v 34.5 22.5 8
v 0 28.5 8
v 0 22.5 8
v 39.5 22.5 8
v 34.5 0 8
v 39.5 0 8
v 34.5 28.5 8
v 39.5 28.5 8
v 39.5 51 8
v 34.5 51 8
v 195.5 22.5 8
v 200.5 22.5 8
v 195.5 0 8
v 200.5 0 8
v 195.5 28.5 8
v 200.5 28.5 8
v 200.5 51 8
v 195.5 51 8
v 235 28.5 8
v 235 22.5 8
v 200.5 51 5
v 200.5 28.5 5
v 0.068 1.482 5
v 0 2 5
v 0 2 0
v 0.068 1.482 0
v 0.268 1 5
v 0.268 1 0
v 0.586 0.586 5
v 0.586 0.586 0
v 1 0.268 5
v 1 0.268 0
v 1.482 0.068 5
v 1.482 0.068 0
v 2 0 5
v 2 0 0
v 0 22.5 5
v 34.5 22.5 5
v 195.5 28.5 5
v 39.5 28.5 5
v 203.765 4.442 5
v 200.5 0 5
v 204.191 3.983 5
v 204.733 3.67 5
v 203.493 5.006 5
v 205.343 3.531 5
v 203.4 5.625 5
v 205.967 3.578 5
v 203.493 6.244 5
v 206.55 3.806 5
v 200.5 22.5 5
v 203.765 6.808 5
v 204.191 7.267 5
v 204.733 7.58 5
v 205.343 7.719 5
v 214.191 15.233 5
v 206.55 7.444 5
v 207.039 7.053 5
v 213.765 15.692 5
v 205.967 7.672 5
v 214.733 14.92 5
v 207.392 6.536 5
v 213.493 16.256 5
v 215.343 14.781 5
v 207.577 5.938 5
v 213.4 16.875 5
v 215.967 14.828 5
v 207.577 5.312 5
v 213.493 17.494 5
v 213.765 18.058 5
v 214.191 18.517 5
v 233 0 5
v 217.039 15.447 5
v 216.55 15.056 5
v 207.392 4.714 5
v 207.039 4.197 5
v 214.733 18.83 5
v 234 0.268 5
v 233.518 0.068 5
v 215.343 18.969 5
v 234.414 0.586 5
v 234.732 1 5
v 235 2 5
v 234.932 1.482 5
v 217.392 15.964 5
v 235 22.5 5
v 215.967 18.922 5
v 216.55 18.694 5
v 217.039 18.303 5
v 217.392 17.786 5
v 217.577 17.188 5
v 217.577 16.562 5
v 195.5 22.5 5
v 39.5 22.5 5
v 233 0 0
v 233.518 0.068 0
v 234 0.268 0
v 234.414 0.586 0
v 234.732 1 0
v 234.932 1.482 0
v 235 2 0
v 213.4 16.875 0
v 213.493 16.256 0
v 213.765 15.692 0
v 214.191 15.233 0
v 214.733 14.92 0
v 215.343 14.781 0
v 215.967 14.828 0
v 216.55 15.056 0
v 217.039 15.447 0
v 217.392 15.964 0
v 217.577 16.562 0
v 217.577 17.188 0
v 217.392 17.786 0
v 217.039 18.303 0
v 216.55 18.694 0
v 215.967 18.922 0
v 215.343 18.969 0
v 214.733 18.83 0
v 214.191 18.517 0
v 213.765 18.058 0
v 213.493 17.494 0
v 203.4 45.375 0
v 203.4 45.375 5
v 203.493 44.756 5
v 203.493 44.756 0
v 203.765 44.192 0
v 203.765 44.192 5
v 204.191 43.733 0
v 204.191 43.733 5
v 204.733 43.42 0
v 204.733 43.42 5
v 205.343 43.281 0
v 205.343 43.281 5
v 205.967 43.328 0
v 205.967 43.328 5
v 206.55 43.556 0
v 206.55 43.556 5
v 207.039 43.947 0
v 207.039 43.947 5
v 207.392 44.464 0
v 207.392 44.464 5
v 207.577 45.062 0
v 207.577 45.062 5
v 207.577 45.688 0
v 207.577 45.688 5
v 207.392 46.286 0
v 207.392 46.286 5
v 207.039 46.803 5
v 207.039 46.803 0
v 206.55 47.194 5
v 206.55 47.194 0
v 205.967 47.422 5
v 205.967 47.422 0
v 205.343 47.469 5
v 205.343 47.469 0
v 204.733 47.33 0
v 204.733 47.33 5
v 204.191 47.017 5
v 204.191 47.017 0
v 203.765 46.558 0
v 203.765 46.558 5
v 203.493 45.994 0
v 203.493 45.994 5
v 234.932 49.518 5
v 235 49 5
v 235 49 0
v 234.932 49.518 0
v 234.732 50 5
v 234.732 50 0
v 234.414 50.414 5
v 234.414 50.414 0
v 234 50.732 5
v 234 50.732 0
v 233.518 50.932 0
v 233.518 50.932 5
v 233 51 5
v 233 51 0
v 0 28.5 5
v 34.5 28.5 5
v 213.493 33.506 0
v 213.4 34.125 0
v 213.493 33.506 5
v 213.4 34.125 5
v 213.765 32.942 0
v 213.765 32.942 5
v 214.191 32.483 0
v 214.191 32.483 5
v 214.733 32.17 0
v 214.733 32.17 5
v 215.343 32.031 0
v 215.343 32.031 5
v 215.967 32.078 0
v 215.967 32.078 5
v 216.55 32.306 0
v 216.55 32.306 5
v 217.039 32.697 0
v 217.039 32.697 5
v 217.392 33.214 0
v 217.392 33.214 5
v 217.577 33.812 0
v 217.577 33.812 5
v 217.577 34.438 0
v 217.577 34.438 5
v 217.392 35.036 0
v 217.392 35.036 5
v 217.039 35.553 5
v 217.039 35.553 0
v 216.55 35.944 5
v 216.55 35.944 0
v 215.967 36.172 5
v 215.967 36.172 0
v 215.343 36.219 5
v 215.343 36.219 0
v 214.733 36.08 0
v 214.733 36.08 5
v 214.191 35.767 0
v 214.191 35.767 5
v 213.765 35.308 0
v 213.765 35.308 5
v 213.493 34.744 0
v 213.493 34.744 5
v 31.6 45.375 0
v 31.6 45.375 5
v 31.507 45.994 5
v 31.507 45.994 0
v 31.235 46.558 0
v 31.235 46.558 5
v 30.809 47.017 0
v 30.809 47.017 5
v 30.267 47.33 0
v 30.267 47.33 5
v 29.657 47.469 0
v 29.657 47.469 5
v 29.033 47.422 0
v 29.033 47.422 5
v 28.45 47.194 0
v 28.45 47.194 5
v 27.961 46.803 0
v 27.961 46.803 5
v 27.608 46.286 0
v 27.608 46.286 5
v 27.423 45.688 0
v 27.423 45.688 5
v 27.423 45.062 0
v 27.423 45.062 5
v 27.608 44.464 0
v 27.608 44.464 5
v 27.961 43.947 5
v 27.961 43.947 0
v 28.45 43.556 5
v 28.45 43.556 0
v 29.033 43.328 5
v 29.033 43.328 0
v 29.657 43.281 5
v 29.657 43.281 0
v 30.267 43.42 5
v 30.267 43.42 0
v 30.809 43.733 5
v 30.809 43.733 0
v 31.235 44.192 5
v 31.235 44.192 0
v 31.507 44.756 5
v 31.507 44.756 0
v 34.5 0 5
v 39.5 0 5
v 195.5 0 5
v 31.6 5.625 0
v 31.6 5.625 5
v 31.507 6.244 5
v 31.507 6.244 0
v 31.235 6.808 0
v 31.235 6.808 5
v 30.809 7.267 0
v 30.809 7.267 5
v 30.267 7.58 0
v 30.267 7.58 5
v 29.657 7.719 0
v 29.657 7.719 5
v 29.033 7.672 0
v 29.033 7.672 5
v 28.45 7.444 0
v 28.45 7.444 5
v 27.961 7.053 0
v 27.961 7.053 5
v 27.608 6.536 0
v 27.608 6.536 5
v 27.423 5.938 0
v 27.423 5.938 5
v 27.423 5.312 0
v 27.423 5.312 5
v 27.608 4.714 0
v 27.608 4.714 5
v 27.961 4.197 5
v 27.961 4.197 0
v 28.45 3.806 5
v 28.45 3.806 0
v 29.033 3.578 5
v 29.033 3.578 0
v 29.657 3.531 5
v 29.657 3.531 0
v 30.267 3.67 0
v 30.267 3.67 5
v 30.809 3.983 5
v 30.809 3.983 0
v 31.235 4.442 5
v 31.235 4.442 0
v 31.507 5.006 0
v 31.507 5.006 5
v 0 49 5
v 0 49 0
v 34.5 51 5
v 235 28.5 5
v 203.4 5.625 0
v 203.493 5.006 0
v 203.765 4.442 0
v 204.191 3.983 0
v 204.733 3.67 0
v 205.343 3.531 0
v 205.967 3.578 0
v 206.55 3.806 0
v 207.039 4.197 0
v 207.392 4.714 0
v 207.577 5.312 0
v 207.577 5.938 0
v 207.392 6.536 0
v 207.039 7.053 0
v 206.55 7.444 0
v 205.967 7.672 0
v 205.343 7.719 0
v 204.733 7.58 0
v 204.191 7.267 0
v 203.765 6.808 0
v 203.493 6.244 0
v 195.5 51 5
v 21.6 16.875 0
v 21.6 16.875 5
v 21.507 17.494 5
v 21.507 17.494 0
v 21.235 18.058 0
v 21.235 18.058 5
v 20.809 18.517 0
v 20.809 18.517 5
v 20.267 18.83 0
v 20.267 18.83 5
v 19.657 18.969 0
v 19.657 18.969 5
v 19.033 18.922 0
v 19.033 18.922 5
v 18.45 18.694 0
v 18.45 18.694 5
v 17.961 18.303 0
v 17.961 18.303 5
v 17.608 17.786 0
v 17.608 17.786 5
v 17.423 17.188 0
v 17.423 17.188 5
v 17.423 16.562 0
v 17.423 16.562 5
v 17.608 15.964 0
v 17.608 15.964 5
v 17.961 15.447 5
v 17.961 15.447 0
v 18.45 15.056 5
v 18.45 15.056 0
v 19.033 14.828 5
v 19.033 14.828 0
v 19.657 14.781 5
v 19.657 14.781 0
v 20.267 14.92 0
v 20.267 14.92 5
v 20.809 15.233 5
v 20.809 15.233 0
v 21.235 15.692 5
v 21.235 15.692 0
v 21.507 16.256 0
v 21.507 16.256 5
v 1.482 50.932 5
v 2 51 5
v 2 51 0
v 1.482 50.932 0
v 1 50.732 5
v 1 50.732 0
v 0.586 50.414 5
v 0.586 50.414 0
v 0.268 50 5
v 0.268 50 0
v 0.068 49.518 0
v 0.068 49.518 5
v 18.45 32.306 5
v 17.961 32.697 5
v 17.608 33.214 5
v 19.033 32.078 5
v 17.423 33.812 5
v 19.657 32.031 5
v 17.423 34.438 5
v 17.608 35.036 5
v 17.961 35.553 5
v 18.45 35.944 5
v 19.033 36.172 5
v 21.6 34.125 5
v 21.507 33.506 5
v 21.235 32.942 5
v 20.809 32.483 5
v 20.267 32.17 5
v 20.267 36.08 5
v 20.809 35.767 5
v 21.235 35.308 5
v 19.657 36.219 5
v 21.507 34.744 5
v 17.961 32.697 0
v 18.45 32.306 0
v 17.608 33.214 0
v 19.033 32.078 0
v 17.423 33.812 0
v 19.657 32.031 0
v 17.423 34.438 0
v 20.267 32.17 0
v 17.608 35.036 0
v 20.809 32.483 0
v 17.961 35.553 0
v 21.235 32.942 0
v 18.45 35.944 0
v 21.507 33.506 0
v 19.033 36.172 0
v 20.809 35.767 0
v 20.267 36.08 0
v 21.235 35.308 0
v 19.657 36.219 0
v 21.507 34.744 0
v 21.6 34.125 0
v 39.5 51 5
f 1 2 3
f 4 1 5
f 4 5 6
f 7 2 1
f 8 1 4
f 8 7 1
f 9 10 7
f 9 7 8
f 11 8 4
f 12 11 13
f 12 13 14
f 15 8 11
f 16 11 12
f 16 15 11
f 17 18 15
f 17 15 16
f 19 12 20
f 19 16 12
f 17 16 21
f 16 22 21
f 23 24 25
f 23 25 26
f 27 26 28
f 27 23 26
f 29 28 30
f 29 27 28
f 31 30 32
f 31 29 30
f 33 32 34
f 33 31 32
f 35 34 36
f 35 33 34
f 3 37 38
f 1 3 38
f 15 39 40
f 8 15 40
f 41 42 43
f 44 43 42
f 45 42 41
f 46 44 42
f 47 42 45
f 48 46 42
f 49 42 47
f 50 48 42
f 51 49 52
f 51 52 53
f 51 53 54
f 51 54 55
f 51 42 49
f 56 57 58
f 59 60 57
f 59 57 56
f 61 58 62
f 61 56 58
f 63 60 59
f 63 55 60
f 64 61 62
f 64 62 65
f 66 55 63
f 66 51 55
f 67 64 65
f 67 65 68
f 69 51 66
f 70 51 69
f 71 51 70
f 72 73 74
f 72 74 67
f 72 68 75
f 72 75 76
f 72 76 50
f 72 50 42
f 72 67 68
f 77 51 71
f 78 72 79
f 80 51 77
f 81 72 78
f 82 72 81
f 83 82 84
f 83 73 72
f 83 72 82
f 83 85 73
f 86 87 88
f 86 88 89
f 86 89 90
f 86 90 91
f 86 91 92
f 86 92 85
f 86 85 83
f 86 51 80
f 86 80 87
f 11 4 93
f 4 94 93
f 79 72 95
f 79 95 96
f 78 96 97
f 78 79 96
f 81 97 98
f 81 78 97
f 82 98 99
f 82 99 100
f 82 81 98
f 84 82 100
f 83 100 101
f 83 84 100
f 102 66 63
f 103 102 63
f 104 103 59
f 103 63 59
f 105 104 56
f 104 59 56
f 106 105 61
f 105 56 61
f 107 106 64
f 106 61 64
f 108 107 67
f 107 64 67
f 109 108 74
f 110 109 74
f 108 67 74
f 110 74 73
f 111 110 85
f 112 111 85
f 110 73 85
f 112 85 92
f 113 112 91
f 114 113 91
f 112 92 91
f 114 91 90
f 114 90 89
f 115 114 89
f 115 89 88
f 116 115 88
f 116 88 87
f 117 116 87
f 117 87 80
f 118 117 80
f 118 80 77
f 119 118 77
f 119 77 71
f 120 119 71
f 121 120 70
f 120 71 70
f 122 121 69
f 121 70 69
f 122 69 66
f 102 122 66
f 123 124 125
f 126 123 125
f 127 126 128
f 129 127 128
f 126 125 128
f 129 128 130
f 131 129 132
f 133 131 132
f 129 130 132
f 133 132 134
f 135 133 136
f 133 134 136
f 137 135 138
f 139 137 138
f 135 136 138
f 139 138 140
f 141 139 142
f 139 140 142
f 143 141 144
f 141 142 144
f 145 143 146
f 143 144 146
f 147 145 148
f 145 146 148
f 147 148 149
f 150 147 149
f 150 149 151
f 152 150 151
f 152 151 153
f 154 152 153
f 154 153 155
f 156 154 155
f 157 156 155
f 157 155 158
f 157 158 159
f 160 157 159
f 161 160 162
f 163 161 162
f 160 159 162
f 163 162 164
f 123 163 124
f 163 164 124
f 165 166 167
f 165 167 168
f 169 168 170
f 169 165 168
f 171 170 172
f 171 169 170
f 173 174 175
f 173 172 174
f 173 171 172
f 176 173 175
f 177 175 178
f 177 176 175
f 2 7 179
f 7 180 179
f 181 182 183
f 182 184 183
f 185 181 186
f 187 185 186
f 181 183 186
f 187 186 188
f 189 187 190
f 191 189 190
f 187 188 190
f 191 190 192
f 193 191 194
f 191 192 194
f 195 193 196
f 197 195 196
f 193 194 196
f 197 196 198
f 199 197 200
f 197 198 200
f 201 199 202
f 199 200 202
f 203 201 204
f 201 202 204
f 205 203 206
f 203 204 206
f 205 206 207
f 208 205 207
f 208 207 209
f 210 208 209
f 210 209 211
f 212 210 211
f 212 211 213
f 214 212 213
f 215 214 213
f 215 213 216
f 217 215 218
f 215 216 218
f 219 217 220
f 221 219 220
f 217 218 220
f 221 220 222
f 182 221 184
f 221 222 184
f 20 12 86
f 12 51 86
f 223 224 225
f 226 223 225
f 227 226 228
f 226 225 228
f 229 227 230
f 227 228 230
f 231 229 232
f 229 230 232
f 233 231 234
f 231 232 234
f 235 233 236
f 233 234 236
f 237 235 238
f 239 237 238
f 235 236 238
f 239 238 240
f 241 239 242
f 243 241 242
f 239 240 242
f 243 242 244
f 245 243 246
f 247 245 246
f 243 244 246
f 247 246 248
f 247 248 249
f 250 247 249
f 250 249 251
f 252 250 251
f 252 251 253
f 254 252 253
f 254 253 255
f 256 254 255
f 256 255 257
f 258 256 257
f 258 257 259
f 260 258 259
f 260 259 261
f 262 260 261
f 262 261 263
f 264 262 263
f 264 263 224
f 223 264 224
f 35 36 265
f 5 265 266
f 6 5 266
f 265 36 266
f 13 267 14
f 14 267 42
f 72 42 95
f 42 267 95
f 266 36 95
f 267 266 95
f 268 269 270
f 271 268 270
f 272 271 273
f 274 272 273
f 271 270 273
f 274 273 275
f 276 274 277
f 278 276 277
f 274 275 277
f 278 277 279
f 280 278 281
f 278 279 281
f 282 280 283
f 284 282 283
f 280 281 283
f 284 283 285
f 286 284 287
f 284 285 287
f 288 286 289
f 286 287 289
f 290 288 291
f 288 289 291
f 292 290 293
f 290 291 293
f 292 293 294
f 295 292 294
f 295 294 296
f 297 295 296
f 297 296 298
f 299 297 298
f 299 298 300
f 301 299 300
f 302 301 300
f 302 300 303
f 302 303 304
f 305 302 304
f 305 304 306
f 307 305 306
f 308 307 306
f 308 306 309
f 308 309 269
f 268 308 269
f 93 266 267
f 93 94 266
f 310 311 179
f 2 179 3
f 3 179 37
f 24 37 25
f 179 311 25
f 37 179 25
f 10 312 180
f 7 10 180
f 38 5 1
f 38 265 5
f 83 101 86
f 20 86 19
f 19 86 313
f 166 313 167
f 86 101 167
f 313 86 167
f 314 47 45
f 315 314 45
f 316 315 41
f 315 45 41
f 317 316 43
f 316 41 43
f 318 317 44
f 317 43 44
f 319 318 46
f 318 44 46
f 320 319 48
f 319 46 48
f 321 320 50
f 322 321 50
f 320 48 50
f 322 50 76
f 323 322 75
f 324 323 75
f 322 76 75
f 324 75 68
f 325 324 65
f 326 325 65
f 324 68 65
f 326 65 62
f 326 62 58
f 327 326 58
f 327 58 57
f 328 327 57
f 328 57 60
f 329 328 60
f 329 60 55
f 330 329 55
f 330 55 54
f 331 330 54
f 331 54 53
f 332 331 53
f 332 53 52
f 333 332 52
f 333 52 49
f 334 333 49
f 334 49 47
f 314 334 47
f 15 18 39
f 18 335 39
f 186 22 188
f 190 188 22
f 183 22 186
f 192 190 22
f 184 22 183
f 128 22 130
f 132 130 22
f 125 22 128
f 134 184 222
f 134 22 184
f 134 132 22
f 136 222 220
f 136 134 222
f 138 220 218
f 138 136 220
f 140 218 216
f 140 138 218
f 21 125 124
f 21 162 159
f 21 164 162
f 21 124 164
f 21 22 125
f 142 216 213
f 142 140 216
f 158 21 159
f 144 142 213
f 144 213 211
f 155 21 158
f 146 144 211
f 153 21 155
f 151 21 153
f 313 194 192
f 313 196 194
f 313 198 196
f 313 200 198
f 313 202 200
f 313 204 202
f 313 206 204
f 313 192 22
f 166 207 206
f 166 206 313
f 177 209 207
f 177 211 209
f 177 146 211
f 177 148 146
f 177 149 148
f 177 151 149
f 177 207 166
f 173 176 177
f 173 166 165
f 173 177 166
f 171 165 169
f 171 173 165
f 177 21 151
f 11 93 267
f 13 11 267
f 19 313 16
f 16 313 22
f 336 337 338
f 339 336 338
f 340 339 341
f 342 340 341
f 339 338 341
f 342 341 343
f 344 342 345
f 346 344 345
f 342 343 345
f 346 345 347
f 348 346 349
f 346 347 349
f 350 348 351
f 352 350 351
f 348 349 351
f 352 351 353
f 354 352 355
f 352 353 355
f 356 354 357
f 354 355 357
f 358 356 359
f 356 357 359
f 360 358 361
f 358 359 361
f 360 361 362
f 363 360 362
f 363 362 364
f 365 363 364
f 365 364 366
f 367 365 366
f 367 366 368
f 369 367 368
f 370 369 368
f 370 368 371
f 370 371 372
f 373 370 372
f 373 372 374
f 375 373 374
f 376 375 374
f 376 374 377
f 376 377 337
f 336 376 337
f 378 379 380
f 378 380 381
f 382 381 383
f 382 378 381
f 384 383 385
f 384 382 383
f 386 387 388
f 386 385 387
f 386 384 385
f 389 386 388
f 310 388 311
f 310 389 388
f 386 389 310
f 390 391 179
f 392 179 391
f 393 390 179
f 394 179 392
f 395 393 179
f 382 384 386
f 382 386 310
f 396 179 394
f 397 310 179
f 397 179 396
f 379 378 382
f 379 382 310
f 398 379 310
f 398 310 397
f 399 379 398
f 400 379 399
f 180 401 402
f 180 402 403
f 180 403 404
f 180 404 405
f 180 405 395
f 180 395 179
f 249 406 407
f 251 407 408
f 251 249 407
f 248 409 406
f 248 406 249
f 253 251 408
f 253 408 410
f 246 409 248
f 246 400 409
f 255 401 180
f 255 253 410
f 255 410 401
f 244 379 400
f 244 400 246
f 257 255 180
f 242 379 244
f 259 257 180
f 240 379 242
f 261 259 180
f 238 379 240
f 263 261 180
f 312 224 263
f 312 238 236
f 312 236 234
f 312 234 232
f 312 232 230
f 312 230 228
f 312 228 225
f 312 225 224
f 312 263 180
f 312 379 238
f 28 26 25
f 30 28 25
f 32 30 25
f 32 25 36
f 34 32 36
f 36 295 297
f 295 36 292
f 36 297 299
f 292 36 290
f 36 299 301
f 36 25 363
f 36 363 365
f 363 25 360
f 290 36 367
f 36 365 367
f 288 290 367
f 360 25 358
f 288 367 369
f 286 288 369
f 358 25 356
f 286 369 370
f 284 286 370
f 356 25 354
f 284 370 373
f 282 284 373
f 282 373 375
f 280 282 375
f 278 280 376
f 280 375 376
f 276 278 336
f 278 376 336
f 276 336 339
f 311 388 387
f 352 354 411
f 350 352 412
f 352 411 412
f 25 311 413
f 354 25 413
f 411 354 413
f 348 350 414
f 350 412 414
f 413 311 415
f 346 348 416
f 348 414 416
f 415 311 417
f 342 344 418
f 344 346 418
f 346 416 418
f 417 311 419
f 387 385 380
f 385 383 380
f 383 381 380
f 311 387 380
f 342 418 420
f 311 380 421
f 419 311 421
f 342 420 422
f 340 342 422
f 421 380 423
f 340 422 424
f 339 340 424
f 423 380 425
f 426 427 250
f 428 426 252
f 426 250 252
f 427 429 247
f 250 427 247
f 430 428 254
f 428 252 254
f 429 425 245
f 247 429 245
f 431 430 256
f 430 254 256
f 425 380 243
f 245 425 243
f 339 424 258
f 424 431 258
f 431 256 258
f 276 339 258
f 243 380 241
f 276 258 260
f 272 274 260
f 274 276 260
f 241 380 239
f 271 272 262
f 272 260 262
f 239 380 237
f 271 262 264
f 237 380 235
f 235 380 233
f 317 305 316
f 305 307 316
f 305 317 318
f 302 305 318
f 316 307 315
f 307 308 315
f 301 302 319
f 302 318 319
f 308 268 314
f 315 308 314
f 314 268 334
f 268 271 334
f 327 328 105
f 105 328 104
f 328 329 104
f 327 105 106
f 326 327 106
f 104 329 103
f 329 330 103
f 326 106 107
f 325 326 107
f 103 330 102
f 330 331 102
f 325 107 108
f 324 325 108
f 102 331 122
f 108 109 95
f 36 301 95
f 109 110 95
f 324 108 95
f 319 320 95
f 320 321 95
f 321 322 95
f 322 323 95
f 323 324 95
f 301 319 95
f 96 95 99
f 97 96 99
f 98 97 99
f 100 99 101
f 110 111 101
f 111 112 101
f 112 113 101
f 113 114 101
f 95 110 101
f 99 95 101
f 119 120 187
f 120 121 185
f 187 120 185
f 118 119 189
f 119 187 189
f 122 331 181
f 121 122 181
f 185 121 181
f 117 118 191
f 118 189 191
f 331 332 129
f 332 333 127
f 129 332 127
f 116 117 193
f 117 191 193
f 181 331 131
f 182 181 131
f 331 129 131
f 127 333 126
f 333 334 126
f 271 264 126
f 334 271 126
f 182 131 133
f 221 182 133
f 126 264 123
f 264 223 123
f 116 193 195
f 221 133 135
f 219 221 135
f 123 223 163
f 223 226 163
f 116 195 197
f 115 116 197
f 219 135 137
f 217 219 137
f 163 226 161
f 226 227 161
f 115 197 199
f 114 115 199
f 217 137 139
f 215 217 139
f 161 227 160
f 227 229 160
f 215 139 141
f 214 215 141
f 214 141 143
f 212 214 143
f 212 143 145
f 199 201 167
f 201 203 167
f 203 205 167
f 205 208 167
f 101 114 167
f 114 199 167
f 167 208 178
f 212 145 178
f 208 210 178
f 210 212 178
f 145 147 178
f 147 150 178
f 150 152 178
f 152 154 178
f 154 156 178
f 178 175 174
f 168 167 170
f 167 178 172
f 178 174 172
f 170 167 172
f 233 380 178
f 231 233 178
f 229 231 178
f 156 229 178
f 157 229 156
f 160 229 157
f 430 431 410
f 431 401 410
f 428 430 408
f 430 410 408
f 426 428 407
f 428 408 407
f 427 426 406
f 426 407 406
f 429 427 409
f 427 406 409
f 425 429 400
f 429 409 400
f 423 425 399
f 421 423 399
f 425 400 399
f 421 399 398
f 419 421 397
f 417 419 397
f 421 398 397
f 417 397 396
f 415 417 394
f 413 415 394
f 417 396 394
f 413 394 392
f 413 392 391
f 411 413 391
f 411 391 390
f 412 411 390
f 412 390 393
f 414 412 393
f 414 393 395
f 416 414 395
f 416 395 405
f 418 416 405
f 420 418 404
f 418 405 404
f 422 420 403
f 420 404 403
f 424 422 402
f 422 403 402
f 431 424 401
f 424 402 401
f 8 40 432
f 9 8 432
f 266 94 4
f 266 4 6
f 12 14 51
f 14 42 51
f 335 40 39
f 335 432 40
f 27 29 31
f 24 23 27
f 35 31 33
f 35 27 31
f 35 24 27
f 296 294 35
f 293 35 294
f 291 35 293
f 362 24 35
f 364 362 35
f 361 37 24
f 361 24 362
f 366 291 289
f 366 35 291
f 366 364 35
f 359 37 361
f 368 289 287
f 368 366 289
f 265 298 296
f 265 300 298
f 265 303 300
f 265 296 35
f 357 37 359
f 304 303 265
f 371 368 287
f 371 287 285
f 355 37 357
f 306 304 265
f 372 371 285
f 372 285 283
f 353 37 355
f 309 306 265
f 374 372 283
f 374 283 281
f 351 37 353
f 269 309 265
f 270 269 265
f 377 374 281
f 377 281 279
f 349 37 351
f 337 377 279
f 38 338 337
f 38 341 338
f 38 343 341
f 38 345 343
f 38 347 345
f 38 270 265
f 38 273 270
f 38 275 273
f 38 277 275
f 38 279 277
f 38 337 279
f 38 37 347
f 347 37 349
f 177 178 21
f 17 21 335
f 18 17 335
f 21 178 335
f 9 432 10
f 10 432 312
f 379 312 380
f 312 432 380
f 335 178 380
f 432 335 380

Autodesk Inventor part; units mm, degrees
ref_plane "YZ Plane" through (0, 0, 0) normal (1, 0, 0) x (0, 1, 0)
ref_plane "XZ Plane" through (0, 0, 0) normal (0, 1, 0) x (-1, 0, 0)
ref_plane "XY Plane" through (0, 0, 0) normal (0, 0, 1) x (1, 0, 0)
sketch "Sketch1" plane through (0, 0, 0) normal (0, 0, 1) x (1, 0, 0)
  line L0 (0, 0) -> (235, 0)
  line L1 (235, 0) -> (235, 51)
  line L2 (235, 51) -> (0, 51)
  line L3 (0, 51) -> (0, 0)
  dimension "d0" = 235
  dimension "d1" = 51
extrude "Extrusion1" add sketch "Sketch1" along normal blind 5
sketch "Sketch2" plane through (0, 0, 5) normal (0, 0, 1) x (1, 0, 0)
  line L0 (0, 0) -> (235, 0)
  line L1 (235, 0) -> (235, 51)
  line L2 (235, 51) -> (0, 51)
  line L3 (0, 51) -> (0, 0)
  line L4 (235, 0) -> (235, 51) projected
  line L5 (0, 22.5) -> (235, 22.5)
  line L6 (235, 22.5) -> (235, 28.5)
  line L7 (235, 28.5) -> (0, 28.5)
  line L8 (0, 28.5) -> (0, 22.5)
  line L9 (0, 22.5) -> (235, 28.5) construction
  line L10 (235, 22.5) -> (0, 28.5) construction
  point P0 (117.5, 25.5)
  dimension "d4" = 6
extrude "Extrusion2" add sketch "Sketch2" along normal blind 3 contours L3 L7 L1 L5
sketch "Sketch3" plane through (0, 0, 5) normal (0, 0, 1) x (1, 0, 0)
  line L0 (0, 28.5) -> (235, 28.5) projected
  line L1 (235, 51) -> (0, 51) projected
  line L2 (34.5, 28.5) -> (39.5, 28.5)
  line L3 (39.5, 28.5) -> (39.5, 51)
  line L4 (39.5, 51) -> (34.5, 51)
  line L5 (34.5, 51) -> (34.5, 28.5)
  point P0 (0, 0)
  dimension "d7" = 5
sketch "Sketch5" plane through (0, 0, 5) normal (0, 0, 1) x (1, 0, 0)
  line L0 (235, 51) -> (0, 51) projected
  line L1 (117.5, 51) -> (117.5, 0)
  line L2 (235, 28.5) -> (0, 28.5) projected
  line L3 (34.5, 51) -> (39.5, 51)
  line L4 (39.5, 51) -> (39.5, 28.5)
  line L5 (39.5, 28.5) -> (34.5, 28.5)
  line L6 (34.5, 28.5) -> (34.5, 51)
  line L7 (0, 22.5) -> (235, 22.5) projected
  line L8 (34.5, 22.5) -> (39.5, 22.5)
  line L9 (39.5, 22.5) -> (39.5, 0)
  line L10 (39.5, 0) -> (34.5, 0)
  line L11 (34.5, 0) -> (34.5, 22.5)
  line L12 (195.5, 51) -> (195.5, 28.5)
  line L13 (200.5, 28.5) -> (200.5, 51)
  line L14 (195.5, 22.5) -> (195.5, 0)
  line L15 (195.5, 0) -> (200.5, 0)
  line L16 (200.5, 0) -> (200.5, 22.5)
  line L17 (195.5, 28.5) -> (200.5, 28.5)
  line L18 (195.5, 22.5) -> (200.5, 22.5)
  line L19 (195.5, 51) -> (200.5, 51)
  point P0 (0, 0)
  dimension "d13" = 5
extrude "Extrusion5" add sketch "Sketch3" along normal blind 3
extrude "Extrusion6" add sketch "Sketch5" along normal blind 3 contours L9 L10 L11 L7
extrude "Extrusion7" add sketch "Sketch5" along normal blind 3 contours L13 L2 L12 L0 | L7 L16 L15 L14
sketch "Sketch8" plane through (0, 0, 5) normal (0, 0, 1) x (1, 0, 0)
  circle A0 centre (29.5, 5.625) radius 1.6
  circle A1 centre (19.5, 16.875) radius 1.6
  line L0 (39.5, 0) -> (39.5, 22.5) projected
  line L1 (34.5, 22.5) -> (34.5, 0) projected
  line L2 (0, 0) -> (34.5, 0) projected
  dimension "d24" = 3.2
  dimension "d25" = 3.2
  dimension "d27" = 5
  dimension "d28" = 5.625
  dimension "d29" = 15
  dimension "d30" = 16.875
extrude "Extrusion9" cut sketch "Sketch8" against normal blind 10
sketch "Sketch9" plane through (0, 0, 8) normal (0, 0, 1) x (1, 0, 0)
  line L0 (0, 51) -> (0, 0) projected
  line L1 (0, 25.5) -> (235, 25.5)
  line L2 (235, 0) -> (235, 51) projected
  line L3 (117.5, 25.5) -> (117.5, -30.3106)
ref_plane "Work Plane1" through (0, 25.5, 8) normal (0, 1, 0) x (1, 0, 0)
mirror "Mirror1" about plane through (0, 25.5, 8) normal (0, 1, 0) of "Extrusion9"
ref_plane "Work Plane2" through (117.5, 25.5, 8) normal (1, 0, 0) x (0, -1, 0)
mirror "Mirror2" about plane through (117.5, 25.5, 8) normal (1, 0, 0) of "Extrusion9", "Mirror1"
sketch "Sketch11" plane through (0, 0, 5) normal (0, 0, 1) x (1, 0, 0)
  circle A0 centre (19.5, 16.875) radius 1.6 projected
  circle A1 centre (19.5, 16.875) radius 2.1
  circle A2 centre (29.5, 5.625) radius 1.6 projected
  circle A3 centre (29.5, 5.625) radius 2.1
  point P0 (0, 0)
  dimension "d35" = 4.2
  dimension "d36" = 4.2
extrude "Extrusion10" cut sketch "Sketch11" against normal blind 10 contours A0 | A1 | A2 | A3
mirror "Mirror3" about plane through (0, 25.5, 8) normal (0, 1, 0) of "Extrusion10"
mirror "Mirror4" about plane through (117.5, 25.5, 8) normal (1, 0, 0) of "Extrusion10", "Mirror3"
fillet "Fillet1" radius 2 4 edges at (235, 51, 2.5) (0, 51, 2.5) (0, 0, 2.5) (235, 0, 2.5)
sketch "Sketch12" plane through (0, 0, 5) normal (0, 0, 1) x (1, 0, 0)
  point P0 (0, 0)
properties part number "Impact Plate" material "ABS Plastic"
